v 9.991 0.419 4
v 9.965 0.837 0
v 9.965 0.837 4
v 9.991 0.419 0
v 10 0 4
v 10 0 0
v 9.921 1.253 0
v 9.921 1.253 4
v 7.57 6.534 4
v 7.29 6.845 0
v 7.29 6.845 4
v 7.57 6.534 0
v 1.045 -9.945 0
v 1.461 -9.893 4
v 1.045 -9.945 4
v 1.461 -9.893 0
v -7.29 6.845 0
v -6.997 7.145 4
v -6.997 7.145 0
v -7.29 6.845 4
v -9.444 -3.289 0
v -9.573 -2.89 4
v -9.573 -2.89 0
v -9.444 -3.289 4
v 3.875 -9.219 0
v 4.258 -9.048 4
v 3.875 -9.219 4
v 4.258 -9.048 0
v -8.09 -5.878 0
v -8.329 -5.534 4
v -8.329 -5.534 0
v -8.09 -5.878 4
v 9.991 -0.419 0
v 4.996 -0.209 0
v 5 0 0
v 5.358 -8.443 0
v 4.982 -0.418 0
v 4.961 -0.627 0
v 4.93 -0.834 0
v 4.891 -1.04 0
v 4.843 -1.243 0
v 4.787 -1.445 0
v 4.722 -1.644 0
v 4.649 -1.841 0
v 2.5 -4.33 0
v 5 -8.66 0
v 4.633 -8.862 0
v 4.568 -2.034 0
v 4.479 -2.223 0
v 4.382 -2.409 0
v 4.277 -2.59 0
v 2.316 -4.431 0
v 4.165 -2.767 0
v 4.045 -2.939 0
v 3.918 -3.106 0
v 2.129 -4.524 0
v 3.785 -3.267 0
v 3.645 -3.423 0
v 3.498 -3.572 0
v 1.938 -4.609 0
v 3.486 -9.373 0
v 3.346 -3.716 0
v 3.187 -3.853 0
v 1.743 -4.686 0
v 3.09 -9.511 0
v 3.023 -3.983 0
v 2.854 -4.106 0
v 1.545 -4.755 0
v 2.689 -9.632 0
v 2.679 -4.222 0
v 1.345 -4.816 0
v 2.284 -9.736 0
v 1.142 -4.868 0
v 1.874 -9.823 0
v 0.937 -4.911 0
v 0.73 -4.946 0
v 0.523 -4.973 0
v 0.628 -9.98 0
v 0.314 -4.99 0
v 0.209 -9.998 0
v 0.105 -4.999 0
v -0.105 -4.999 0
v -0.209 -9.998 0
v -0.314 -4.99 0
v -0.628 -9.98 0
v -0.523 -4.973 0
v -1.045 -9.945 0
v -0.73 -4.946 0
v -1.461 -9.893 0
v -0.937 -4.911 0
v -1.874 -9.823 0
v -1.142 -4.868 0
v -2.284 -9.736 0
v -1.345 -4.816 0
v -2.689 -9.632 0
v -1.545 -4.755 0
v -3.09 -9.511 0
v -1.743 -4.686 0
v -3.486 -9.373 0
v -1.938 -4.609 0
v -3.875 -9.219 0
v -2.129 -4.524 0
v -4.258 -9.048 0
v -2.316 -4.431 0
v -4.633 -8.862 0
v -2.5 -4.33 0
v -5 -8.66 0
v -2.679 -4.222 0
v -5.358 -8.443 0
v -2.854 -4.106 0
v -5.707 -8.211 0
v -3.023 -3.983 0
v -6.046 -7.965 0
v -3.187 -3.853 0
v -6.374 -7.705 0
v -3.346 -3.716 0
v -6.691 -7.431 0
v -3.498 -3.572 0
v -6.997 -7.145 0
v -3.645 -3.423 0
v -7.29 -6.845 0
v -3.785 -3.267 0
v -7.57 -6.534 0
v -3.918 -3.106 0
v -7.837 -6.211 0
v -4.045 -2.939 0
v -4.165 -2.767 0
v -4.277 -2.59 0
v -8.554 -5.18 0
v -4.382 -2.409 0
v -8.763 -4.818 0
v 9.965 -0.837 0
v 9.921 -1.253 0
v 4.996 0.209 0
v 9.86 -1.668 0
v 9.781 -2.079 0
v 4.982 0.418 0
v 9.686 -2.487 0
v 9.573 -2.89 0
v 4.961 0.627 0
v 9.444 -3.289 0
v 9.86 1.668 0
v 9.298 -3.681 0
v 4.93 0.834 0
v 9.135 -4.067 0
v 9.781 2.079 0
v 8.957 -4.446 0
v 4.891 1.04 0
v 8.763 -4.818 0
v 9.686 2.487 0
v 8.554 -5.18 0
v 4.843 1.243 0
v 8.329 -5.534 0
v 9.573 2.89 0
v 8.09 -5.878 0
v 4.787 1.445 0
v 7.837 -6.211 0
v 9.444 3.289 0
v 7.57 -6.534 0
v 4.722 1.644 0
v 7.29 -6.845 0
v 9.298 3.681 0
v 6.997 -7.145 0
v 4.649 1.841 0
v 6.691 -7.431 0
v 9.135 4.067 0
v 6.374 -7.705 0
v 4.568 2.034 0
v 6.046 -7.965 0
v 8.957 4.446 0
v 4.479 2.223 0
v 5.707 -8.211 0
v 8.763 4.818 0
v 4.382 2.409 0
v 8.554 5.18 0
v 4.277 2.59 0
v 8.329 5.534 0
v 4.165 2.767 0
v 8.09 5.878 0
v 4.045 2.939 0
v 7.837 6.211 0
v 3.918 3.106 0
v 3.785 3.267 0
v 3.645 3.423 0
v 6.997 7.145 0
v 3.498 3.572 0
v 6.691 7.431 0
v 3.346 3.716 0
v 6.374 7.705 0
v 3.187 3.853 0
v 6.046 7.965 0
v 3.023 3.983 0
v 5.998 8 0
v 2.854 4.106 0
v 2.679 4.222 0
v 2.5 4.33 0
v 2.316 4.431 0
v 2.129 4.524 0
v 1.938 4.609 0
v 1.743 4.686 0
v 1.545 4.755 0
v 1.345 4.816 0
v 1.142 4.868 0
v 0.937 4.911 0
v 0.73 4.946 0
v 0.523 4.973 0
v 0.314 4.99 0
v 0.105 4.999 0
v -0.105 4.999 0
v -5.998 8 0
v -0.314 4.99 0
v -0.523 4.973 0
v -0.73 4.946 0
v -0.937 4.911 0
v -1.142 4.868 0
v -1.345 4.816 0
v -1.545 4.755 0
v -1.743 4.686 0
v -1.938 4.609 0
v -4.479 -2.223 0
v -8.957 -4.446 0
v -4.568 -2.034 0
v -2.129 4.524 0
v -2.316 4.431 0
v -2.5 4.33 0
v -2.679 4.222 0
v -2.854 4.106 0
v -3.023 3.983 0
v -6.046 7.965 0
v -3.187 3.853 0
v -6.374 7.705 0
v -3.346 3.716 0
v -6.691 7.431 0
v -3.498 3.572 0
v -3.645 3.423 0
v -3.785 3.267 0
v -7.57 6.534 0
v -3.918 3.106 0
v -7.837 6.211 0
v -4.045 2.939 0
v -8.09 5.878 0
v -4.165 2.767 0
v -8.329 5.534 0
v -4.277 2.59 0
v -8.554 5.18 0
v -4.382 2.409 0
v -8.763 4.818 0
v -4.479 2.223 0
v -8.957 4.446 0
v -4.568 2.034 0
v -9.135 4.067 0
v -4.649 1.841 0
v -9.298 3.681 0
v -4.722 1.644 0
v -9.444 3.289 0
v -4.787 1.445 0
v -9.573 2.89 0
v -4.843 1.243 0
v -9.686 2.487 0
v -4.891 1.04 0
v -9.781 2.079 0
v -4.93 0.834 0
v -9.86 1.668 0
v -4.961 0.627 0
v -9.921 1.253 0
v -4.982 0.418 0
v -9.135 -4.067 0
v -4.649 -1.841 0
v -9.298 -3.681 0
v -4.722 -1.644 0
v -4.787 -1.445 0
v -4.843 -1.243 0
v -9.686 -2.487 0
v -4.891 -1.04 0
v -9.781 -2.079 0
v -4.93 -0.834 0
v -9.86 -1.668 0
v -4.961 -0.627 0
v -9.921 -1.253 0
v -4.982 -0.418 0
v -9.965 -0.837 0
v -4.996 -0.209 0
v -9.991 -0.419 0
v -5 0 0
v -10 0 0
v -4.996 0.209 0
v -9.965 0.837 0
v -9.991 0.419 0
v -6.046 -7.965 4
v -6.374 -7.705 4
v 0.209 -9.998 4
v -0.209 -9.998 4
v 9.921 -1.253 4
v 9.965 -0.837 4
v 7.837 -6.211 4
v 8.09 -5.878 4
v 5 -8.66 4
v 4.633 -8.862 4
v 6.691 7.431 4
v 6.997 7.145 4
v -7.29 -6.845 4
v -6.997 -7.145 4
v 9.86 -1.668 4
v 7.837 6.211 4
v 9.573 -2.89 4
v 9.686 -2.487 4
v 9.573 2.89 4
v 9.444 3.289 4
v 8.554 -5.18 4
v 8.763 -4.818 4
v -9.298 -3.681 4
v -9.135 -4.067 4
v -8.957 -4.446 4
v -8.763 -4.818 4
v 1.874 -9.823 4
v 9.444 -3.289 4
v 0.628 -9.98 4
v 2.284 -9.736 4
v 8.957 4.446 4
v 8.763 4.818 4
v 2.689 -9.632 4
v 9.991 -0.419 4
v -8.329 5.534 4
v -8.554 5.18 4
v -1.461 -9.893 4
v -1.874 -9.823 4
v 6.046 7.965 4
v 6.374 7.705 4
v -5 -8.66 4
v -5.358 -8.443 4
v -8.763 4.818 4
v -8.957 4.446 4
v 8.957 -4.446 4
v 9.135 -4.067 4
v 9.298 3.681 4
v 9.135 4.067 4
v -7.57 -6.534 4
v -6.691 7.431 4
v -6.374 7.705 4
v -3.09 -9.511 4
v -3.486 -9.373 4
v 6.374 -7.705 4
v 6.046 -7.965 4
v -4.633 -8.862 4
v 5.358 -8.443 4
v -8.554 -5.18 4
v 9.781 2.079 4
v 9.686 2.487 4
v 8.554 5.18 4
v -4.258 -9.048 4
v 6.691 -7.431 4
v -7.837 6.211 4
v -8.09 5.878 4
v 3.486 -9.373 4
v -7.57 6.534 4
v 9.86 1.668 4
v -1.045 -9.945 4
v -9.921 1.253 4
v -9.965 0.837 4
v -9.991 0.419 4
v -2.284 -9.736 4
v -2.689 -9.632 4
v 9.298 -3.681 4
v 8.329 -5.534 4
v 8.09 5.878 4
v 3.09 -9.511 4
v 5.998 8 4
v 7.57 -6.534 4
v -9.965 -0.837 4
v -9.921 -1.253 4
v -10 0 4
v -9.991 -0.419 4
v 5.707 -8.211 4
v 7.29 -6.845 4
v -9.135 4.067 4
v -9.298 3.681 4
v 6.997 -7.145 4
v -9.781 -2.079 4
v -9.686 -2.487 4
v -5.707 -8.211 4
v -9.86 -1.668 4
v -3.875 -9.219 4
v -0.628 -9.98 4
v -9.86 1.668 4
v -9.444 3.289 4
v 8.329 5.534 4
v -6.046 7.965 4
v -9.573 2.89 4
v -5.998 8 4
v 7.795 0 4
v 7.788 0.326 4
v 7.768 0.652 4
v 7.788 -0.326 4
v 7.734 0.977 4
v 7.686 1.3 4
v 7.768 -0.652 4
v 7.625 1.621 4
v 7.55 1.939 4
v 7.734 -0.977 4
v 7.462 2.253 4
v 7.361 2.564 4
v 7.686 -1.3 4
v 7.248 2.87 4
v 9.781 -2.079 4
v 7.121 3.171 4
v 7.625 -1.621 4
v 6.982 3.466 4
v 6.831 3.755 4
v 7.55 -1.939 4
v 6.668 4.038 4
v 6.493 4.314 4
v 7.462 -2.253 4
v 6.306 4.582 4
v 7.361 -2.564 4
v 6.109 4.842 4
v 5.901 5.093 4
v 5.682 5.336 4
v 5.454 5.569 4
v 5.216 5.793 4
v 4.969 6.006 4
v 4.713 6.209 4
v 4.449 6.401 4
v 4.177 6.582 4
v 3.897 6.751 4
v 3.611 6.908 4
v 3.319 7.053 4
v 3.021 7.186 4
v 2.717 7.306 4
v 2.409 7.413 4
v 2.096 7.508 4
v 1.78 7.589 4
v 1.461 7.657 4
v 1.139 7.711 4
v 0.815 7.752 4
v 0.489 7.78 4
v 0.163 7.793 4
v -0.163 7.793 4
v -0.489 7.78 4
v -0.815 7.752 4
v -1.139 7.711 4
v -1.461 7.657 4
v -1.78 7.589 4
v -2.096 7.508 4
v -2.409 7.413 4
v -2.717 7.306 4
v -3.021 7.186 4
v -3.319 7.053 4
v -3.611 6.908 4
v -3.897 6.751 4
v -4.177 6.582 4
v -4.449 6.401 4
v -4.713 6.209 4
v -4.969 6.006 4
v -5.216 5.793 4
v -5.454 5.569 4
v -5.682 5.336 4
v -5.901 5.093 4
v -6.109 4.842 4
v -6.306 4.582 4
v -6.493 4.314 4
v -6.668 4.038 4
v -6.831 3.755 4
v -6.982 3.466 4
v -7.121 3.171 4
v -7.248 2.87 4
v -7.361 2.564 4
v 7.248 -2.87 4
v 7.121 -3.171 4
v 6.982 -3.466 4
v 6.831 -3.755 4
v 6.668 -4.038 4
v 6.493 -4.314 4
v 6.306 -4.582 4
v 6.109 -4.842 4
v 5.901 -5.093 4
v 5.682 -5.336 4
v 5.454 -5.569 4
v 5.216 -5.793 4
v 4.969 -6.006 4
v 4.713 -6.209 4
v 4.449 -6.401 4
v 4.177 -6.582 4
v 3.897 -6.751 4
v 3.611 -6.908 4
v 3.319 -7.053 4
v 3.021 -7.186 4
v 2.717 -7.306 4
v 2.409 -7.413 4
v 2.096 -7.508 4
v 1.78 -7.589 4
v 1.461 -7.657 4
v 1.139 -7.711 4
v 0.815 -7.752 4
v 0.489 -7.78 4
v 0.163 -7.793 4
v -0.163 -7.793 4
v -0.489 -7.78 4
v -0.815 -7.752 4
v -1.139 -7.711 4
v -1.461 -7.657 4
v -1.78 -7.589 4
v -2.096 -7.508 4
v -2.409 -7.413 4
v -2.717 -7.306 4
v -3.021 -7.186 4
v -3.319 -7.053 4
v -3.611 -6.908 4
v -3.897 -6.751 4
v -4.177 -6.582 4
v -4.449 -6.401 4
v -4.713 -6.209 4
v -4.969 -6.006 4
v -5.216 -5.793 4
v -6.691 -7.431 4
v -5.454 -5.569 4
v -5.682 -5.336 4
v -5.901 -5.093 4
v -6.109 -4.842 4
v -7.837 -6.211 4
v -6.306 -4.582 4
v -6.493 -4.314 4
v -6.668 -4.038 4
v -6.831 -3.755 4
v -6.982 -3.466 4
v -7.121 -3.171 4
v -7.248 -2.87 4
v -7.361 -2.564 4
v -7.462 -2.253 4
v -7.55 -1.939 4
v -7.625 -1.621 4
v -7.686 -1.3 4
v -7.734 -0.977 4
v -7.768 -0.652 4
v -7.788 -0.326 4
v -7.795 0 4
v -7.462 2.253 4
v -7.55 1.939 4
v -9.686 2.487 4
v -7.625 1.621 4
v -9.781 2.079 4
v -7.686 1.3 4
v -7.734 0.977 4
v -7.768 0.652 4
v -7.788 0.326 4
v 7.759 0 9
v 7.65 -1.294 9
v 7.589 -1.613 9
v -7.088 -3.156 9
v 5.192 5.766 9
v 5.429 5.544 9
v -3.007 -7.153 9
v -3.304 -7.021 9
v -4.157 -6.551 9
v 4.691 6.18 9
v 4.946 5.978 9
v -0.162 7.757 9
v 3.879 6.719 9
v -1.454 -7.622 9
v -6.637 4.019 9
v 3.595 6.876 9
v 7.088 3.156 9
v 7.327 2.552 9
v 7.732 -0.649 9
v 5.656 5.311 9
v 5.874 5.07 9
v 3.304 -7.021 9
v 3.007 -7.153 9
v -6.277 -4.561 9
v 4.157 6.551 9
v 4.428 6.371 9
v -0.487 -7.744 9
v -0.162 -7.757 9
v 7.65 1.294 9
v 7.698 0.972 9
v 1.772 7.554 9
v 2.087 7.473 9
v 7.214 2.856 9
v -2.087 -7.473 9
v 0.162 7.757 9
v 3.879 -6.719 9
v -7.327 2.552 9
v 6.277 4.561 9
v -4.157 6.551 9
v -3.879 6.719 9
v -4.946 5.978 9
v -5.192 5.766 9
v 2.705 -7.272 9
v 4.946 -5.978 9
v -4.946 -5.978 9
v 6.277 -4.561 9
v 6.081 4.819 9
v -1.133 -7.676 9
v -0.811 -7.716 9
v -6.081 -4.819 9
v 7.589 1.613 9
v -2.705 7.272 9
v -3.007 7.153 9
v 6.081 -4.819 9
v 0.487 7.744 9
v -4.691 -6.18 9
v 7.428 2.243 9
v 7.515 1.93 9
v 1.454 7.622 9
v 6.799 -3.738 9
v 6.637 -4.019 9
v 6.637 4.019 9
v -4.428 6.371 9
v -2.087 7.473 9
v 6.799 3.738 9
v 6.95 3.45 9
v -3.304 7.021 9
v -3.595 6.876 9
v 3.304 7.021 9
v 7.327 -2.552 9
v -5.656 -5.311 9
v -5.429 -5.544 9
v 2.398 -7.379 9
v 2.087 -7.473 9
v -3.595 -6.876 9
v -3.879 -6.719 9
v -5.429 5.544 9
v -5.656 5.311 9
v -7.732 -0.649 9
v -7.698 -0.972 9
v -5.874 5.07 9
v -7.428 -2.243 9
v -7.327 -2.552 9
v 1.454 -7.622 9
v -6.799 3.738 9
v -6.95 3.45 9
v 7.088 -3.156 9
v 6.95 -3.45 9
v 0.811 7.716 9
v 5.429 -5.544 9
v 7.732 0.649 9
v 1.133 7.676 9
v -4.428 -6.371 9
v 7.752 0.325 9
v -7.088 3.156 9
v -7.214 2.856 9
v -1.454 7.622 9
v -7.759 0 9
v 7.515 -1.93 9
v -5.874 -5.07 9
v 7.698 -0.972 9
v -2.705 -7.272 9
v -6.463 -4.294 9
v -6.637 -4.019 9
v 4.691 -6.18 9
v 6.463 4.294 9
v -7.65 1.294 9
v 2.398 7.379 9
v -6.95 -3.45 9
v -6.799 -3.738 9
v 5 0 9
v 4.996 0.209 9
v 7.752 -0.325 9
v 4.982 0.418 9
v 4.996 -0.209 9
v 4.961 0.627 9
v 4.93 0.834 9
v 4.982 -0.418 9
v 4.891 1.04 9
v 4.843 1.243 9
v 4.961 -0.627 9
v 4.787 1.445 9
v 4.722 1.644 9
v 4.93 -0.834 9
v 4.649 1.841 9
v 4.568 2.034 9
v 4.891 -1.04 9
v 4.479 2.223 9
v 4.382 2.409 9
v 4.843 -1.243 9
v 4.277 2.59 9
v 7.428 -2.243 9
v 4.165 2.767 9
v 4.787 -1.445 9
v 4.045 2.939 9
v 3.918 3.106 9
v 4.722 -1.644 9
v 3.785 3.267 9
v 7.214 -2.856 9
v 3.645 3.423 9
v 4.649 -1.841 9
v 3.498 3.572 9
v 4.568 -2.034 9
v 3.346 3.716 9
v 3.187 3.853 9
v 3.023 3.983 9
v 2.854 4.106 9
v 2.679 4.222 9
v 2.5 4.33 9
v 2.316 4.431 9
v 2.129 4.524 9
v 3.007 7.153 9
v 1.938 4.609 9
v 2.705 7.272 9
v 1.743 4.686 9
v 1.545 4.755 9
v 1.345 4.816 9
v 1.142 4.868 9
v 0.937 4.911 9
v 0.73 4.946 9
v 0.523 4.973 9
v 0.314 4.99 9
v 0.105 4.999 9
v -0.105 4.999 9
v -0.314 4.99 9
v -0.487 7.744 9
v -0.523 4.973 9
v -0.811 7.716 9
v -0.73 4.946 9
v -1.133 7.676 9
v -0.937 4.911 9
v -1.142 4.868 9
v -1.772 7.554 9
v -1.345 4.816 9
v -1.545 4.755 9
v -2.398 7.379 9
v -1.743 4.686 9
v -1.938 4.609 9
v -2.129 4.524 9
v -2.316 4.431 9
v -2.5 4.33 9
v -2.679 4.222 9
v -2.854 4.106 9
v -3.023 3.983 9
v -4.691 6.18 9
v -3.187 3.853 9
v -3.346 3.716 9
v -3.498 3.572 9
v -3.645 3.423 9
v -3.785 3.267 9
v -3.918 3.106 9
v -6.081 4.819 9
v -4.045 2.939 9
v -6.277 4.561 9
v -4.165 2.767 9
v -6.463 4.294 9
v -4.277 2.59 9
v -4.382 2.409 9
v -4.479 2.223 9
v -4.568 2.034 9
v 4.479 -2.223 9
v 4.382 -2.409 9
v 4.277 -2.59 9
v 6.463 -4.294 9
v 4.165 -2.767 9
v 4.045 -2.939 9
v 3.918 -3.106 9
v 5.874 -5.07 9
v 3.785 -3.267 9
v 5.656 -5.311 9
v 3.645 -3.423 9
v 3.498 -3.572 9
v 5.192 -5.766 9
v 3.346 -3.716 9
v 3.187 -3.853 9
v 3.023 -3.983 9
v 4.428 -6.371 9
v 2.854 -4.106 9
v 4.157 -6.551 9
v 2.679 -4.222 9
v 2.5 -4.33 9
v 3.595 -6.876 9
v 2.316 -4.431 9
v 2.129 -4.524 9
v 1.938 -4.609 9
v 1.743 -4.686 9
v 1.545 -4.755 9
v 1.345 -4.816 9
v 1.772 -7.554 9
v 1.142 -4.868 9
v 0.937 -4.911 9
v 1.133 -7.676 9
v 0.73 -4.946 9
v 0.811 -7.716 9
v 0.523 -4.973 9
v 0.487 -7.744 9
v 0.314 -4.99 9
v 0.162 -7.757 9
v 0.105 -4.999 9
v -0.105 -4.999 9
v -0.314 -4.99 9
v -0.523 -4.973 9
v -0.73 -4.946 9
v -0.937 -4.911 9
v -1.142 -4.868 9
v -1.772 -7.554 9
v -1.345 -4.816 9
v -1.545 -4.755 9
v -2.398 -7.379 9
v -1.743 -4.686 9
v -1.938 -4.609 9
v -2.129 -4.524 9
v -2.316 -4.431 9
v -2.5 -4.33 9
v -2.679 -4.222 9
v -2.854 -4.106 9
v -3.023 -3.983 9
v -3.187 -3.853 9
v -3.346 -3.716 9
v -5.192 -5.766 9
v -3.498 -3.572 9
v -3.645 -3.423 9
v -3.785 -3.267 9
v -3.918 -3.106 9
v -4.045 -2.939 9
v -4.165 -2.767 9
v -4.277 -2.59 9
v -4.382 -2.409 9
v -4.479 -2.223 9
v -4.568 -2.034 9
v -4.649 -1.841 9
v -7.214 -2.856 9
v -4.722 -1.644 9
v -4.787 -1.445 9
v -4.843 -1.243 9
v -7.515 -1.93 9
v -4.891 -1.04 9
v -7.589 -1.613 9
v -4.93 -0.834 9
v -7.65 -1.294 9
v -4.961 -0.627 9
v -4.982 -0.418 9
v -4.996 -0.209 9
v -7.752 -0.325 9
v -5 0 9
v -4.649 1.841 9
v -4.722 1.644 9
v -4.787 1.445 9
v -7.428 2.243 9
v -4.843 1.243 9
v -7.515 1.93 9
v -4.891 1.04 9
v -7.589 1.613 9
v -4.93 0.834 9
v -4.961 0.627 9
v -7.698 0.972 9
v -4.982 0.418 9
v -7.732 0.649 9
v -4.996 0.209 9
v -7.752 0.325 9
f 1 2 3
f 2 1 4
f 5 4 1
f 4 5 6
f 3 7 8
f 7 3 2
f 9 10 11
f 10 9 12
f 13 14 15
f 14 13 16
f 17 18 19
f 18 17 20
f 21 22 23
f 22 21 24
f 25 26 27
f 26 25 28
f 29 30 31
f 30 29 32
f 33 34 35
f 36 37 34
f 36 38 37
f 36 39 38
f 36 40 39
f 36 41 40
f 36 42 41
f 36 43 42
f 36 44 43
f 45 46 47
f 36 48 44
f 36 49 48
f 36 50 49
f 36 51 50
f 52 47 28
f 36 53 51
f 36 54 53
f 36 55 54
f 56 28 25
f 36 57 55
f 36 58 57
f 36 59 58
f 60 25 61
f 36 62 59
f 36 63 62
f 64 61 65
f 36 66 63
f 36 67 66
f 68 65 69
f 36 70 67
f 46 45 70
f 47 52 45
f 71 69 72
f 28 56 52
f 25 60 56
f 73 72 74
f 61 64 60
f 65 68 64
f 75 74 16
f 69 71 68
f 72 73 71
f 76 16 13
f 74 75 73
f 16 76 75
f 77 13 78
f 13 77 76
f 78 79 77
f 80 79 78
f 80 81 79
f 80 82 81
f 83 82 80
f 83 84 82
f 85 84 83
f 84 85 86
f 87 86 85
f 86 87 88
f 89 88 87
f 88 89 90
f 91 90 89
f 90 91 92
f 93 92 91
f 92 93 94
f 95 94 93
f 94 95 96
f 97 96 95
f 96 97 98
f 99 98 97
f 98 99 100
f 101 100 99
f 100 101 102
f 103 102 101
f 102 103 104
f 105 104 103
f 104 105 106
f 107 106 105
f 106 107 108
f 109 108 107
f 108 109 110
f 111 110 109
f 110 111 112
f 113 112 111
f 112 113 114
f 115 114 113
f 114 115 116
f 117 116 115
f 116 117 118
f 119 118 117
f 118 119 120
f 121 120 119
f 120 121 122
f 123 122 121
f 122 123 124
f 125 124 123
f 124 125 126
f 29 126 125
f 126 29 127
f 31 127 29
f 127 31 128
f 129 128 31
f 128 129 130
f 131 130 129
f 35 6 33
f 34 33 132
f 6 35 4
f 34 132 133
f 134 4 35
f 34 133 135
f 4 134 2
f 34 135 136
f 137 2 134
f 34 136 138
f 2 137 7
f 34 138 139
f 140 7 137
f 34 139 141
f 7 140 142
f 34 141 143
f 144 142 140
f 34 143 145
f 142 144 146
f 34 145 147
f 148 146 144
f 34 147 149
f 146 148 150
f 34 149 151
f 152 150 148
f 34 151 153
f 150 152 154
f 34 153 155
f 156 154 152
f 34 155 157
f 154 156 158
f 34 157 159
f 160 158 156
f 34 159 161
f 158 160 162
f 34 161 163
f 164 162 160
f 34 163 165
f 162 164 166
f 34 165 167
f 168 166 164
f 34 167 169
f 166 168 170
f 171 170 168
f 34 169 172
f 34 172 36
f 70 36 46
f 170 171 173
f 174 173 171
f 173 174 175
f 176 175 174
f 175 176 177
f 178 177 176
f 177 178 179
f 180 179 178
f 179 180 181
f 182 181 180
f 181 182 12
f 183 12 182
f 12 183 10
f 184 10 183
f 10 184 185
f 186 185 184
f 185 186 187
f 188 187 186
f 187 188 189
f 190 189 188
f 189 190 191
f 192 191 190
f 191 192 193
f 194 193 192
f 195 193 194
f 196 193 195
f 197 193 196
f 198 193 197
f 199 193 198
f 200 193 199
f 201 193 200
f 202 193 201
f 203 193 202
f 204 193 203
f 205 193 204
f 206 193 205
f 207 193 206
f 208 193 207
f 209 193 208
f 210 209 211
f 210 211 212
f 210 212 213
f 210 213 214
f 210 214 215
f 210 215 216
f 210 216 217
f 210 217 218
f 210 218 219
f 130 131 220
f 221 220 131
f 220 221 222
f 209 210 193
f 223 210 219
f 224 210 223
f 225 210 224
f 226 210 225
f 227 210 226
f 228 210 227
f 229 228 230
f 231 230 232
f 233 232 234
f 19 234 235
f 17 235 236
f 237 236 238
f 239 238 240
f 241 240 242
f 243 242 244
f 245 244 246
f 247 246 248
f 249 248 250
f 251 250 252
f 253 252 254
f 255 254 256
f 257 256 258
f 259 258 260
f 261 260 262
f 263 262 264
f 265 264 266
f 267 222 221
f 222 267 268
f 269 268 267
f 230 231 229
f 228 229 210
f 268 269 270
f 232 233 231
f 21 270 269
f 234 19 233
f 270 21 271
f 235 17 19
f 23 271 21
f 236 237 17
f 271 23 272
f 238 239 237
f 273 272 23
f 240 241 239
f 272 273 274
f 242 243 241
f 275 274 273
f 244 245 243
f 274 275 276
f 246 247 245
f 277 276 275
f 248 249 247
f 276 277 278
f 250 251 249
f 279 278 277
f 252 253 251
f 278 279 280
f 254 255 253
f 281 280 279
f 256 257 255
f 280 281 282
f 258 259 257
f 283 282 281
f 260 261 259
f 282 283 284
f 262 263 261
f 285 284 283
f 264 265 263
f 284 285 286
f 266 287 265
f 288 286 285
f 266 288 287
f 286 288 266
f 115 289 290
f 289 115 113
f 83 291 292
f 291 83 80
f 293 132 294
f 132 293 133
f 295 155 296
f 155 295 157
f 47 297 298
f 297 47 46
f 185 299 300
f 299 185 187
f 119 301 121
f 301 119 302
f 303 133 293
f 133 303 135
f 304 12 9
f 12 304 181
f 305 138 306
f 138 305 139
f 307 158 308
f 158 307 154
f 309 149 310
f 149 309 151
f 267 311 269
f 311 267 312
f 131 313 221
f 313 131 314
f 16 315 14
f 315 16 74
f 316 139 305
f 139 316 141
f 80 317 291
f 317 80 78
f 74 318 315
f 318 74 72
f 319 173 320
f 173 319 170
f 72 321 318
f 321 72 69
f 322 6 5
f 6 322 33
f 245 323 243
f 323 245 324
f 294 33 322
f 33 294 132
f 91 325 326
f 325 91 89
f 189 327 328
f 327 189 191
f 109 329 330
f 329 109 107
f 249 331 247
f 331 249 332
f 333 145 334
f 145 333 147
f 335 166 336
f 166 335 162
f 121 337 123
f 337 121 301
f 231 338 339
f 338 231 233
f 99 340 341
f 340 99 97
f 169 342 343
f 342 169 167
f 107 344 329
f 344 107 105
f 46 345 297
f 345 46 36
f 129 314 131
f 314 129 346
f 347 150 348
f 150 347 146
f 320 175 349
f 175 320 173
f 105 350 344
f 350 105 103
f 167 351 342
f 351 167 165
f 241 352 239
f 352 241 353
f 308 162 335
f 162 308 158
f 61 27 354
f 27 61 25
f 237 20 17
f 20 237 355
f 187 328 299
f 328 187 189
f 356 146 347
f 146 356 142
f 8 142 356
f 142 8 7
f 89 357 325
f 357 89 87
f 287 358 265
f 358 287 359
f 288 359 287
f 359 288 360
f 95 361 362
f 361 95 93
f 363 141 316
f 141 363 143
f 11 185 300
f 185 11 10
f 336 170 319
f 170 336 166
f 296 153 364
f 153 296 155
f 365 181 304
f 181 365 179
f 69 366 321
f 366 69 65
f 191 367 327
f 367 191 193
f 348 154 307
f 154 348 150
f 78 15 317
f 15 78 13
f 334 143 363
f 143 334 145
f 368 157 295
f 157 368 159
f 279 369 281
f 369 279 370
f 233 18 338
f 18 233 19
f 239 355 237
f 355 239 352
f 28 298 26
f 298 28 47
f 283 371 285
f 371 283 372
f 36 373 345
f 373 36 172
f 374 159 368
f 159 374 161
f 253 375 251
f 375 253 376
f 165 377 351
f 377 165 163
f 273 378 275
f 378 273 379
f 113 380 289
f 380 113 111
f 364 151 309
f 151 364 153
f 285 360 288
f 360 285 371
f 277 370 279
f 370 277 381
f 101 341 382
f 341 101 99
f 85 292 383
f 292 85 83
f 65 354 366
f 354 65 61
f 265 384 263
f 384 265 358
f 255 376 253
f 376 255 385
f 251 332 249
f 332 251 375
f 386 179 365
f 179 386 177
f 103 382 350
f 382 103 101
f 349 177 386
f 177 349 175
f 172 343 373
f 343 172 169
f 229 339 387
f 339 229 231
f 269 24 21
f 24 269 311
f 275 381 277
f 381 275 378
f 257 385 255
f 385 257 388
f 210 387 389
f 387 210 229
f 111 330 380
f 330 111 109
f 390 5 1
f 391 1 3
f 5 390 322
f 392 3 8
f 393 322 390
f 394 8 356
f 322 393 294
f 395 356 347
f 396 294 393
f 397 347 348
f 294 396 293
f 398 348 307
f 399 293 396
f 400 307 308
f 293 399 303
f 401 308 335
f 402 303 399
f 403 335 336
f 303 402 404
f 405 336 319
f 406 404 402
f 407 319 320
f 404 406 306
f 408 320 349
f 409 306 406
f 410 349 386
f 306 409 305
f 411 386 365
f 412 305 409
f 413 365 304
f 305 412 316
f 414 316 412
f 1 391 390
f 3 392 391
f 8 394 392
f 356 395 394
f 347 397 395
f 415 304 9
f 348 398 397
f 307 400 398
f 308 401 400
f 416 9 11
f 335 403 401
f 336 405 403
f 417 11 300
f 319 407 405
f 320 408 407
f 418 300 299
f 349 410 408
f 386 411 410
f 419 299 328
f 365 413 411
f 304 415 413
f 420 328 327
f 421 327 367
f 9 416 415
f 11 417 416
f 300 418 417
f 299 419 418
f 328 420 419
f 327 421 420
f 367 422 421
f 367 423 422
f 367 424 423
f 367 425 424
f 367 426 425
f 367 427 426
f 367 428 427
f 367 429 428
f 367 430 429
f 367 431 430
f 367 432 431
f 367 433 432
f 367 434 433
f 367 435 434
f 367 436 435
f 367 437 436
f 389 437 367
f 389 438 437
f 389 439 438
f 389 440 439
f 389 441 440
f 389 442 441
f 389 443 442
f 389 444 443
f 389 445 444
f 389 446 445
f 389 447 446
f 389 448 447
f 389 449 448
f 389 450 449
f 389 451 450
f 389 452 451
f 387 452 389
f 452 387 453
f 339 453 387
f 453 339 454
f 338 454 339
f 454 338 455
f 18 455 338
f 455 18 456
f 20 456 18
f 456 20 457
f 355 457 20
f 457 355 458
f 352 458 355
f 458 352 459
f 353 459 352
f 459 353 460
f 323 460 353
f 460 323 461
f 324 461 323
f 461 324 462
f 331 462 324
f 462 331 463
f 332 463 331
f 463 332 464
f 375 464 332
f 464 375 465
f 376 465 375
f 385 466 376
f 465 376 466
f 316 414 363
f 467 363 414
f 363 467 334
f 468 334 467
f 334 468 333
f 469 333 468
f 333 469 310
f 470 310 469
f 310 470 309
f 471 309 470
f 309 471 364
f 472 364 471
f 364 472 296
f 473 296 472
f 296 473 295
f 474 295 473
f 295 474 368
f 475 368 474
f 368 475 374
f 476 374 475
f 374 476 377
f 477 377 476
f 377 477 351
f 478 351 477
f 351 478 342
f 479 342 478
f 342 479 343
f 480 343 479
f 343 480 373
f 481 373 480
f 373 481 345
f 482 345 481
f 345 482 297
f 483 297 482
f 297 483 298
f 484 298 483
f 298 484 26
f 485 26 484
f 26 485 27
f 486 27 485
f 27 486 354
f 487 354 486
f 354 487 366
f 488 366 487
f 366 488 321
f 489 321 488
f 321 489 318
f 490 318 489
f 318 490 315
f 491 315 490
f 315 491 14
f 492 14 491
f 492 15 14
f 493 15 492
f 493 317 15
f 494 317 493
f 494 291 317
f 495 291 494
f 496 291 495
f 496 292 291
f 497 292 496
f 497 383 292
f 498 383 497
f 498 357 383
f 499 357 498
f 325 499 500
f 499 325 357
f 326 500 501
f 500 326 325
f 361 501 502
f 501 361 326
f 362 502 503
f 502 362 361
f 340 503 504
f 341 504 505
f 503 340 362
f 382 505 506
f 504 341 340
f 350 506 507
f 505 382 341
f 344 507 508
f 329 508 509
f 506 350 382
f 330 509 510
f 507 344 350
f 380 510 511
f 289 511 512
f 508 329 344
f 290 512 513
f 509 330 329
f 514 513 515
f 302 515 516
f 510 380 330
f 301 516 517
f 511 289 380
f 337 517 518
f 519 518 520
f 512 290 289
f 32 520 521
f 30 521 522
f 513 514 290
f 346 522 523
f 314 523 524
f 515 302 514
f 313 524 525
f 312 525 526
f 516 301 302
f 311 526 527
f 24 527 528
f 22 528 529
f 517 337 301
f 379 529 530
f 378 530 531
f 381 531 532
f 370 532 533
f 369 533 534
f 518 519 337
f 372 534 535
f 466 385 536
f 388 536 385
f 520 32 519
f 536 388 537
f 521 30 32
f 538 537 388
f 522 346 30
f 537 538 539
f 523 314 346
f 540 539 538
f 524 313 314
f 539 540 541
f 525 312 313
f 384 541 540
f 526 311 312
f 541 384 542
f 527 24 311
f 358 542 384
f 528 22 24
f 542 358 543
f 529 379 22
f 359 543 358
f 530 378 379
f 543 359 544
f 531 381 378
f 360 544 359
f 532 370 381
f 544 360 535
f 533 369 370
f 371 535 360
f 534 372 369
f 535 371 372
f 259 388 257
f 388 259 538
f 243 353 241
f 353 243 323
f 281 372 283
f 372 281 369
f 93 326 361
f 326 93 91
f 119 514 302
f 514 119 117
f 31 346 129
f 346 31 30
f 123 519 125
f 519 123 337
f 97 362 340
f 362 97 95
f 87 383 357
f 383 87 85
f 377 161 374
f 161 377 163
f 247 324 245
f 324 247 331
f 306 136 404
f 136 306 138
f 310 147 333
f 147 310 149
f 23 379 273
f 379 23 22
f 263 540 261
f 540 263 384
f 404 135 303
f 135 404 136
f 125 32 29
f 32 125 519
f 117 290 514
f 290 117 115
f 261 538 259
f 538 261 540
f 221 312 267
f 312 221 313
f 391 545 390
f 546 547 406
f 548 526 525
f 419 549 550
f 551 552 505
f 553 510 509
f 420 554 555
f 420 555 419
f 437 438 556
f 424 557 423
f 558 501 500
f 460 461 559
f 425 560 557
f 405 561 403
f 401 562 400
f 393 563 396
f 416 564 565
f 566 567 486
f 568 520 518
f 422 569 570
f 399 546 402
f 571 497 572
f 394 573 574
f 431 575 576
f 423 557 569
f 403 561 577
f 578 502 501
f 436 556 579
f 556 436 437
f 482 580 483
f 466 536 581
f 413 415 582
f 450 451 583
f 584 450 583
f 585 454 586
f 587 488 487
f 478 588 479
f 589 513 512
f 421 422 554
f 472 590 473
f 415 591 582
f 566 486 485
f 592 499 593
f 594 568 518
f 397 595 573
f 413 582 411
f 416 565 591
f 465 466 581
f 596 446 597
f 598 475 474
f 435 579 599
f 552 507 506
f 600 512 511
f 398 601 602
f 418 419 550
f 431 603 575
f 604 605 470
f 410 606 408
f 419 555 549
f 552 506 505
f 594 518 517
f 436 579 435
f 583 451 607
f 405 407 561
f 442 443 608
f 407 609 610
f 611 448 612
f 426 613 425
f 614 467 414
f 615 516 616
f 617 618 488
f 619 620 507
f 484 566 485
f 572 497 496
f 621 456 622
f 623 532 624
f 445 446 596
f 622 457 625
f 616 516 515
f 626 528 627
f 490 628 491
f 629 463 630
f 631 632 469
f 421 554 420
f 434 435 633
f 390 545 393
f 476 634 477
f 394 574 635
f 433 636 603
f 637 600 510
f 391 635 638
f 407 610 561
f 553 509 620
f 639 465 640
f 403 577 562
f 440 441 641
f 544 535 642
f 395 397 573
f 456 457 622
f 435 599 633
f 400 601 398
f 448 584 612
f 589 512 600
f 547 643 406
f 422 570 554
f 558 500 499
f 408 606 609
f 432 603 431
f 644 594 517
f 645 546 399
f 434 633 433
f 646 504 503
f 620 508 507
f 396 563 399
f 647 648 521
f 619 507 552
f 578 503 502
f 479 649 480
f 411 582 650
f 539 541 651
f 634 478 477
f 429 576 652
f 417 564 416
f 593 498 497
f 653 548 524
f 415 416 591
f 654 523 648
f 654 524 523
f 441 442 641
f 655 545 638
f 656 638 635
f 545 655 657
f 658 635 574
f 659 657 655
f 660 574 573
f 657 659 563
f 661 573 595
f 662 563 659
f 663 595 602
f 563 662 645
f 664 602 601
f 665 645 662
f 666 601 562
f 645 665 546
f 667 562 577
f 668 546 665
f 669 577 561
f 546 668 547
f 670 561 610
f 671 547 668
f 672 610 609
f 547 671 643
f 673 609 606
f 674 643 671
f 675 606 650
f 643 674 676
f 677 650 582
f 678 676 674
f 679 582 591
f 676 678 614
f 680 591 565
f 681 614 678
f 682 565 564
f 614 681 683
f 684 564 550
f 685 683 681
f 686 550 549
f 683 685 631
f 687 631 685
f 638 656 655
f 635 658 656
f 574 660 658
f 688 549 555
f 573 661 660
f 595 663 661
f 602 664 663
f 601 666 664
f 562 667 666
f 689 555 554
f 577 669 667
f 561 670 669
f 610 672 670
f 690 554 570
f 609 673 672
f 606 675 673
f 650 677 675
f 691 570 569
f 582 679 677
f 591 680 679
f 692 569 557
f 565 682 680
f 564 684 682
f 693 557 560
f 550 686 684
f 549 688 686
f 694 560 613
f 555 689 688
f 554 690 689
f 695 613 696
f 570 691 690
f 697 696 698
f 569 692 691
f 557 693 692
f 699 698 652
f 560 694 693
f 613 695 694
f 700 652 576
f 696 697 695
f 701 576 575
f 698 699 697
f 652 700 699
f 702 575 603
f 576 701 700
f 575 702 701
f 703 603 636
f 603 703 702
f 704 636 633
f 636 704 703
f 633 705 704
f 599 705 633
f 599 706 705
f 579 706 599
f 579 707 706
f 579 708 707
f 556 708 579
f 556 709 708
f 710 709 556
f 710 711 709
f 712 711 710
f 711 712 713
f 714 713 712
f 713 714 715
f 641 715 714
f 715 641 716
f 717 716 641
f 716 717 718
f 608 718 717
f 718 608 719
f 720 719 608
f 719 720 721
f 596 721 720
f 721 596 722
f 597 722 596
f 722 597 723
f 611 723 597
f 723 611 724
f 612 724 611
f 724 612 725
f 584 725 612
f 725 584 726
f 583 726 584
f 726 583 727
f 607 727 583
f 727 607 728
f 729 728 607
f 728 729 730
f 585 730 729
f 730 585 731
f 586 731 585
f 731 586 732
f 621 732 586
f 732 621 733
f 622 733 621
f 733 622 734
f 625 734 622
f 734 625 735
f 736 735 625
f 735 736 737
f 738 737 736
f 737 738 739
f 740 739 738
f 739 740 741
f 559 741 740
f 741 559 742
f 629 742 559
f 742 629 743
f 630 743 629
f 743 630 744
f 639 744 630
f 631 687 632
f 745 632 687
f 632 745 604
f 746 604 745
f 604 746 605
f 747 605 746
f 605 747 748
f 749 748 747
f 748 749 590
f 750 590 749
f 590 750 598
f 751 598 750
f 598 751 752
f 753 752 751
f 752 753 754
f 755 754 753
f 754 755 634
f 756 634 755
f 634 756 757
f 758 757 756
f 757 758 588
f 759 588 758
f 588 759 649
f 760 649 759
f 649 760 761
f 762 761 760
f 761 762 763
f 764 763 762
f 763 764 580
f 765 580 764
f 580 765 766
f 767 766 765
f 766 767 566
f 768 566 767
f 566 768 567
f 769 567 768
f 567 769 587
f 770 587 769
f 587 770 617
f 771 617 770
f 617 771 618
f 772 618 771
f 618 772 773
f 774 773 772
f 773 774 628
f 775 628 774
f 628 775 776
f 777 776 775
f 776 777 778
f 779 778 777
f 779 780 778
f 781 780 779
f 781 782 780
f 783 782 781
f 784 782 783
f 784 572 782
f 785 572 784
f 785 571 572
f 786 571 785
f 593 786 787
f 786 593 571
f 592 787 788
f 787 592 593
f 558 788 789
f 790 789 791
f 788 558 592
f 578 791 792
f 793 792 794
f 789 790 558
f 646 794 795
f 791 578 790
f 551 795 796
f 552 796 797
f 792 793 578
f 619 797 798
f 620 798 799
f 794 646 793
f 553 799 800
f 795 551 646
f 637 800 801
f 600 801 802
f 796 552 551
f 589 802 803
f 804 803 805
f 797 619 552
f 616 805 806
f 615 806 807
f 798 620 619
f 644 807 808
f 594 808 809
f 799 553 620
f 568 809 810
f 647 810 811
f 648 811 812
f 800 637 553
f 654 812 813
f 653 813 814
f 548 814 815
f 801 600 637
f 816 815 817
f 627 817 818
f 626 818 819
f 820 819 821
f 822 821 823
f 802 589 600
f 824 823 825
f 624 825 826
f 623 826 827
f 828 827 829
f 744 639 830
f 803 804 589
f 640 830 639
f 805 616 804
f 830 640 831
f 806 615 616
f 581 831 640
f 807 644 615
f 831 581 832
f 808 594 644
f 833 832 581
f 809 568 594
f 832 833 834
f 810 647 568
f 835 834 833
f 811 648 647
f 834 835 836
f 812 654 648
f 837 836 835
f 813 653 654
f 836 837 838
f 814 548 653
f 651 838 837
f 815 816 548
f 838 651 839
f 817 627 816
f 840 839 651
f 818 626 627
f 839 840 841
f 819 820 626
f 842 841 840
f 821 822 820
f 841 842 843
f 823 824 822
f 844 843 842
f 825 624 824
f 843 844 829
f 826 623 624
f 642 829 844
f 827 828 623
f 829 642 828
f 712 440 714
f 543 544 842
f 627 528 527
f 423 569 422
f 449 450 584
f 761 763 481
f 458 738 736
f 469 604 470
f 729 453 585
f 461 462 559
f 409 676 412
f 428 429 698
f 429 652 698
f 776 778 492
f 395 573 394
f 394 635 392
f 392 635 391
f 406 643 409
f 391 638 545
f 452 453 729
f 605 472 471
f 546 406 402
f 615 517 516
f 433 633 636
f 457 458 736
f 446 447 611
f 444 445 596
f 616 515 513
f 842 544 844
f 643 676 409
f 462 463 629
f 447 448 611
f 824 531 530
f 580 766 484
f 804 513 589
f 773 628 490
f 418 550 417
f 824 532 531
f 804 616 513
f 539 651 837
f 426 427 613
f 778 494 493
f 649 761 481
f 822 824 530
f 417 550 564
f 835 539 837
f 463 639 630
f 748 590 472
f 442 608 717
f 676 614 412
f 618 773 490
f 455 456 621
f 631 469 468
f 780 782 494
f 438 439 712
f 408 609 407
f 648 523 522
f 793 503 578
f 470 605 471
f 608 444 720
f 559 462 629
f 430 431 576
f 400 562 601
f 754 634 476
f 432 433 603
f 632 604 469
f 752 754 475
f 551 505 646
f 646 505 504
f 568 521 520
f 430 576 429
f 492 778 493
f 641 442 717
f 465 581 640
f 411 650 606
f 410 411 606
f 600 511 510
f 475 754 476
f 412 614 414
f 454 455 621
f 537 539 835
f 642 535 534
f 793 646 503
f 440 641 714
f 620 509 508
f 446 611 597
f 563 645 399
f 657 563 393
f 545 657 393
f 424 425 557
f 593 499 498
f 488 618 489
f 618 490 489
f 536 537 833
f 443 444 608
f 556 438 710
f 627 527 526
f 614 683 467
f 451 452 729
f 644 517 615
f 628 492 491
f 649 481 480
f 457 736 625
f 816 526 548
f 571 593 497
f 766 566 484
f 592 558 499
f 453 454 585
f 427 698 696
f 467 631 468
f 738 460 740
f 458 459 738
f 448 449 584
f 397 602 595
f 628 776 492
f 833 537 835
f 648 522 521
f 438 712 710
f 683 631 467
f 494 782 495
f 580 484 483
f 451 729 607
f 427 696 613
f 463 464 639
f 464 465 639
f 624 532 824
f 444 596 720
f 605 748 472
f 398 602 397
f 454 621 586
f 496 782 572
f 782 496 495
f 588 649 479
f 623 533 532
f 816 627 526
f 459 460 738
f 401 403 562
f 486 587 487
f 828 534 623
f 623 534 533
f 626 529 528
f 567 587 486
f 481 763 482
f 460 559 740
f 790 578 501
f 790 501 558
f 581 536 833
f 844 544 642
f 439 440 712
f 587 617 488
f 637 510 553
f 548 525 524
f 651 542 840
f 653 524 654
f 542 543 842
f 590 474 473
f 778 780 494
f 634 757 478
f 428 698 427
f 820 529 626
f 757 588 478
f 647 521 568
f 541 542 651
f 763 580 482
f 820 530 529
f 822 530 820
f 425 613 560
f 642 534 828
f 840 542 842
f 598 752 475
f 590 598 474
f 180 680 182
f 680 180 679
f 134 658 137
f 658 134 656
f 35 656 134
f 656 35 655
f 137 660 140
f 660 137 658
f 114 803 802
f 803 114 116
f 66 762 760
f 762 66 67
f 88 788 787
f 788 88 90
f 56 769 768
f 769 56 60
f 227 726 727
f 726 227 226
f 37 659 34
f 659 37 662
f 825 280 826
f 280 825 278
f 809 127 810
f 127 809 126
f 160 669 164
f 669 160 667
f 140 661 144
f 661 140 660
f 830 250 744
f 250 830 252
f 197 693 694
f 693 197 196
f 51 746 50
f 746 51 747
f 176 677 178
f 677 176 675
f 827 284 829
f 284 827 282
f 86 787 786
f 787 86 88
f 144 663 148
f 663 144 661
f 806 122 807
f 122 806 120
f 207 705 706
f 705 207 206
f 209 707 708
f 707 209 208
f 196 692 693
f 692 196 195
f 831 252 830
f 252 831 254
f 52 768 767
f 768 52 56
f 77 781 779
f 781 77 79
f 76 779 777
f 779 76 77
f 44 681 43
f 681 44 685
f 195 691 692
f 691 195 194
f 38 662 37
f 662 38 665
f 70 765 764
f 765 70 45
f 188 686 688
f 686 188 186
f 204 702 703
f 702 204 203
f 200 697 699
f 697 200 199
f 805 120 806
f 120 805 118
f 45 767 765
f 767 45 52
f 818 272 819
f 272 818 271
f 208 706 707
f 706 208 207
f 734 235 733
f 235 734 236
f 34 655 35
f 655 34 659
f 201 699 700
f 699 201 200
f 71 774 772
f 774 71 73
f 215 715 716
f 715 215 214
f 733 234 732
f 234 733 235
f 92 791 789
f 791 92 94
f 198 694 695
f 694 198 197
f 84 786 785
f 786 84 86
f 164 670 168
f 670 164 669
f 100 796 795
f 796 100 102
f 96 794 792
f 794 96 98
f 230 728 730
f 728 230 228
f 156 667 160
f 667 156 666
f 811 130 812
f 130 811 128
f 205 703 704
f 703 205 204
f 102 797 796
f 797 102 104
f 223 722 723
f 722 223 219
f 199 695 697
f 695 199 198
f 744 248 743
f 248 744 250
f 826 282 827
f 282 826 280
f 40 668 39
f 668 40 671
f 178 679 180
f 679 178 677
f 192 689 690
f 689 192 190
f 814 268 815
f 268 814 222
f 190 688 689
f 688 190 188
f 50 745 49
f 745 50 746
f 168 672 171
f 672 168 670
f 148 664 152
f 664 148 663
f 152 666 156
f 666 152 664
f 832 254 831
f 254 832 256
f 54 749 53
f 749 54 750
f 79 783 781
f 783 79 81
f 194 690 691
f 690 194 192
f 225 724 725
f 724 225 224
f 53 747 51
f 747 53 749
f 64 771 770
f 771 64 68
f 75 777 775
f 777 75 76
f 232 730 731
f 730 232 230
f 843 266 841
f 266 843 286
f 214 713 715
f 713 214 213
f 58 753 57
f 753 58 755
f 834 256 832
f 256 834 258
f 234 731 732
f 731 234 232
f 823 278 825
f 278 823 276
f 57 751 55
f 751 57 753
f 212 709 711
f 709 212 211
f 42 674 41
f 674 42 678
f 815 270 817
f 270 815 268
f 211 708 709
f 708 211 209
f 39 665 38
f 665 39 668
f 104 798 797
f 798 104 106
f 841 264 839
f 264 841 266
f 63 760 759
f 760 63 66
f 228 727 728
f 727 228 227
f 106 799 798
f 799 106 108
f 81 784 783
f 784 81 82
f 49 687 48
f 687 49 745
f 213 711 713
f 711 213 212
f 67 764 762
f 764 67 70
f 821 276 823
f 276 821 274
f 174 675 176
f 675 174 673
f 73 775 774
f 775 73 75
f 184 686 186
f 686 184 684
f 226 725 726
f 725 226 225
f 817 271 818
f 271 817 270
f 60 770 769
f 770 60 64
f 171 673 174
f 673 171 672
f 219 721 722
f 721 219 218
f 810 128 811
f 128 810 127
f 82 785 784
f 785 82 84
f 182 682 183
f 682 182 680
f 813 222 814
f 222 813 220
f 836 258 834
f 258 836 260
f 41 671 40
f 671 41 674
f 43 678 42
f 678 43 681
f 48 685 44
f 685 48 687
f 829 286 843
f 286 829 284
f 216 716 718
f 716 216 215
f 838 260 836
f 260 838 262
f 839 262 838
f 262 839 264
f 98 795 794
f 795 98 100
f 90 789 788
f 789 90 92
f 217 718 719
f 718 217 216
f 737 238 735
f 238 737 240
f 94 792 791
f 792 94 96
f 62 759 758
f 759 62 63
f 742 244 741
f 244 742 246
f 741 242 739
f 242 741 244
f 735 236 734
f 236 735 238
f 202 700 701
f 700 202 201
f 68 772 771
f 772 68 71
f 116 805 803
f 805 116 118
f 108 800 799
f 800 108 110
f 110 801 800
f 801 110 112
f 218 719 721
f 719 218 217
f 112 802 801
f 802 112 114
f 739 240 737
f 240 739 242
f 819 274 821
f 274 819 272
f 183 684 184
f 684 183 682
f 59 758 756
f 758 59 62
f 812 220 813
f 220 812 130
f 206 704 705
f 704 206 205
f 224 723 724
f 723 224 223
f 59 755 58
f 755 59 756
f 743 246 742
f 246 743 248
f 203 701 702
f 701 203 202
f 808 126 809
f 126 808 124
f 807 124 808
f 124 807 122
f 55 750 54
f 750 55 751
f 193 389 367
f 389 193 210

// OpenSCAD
difference() {
    
    
union() {
    
    
translate(v = [0, 0, 2]) {


cylinder(4,10,10,$fn = 150, center= true);}


translate(v = [0, 0, 6.5]) {


    cylinder(5,7.795,7.759,$fn = 150, center= true);}
}

translate(v = [0, 0,4.5]) {
    cylinder (h = 14, r=5, center = true, $fn=150);
}

translate(v = [0, 12, 5]) {

    cube([20,8,12],center= true);
}


}
